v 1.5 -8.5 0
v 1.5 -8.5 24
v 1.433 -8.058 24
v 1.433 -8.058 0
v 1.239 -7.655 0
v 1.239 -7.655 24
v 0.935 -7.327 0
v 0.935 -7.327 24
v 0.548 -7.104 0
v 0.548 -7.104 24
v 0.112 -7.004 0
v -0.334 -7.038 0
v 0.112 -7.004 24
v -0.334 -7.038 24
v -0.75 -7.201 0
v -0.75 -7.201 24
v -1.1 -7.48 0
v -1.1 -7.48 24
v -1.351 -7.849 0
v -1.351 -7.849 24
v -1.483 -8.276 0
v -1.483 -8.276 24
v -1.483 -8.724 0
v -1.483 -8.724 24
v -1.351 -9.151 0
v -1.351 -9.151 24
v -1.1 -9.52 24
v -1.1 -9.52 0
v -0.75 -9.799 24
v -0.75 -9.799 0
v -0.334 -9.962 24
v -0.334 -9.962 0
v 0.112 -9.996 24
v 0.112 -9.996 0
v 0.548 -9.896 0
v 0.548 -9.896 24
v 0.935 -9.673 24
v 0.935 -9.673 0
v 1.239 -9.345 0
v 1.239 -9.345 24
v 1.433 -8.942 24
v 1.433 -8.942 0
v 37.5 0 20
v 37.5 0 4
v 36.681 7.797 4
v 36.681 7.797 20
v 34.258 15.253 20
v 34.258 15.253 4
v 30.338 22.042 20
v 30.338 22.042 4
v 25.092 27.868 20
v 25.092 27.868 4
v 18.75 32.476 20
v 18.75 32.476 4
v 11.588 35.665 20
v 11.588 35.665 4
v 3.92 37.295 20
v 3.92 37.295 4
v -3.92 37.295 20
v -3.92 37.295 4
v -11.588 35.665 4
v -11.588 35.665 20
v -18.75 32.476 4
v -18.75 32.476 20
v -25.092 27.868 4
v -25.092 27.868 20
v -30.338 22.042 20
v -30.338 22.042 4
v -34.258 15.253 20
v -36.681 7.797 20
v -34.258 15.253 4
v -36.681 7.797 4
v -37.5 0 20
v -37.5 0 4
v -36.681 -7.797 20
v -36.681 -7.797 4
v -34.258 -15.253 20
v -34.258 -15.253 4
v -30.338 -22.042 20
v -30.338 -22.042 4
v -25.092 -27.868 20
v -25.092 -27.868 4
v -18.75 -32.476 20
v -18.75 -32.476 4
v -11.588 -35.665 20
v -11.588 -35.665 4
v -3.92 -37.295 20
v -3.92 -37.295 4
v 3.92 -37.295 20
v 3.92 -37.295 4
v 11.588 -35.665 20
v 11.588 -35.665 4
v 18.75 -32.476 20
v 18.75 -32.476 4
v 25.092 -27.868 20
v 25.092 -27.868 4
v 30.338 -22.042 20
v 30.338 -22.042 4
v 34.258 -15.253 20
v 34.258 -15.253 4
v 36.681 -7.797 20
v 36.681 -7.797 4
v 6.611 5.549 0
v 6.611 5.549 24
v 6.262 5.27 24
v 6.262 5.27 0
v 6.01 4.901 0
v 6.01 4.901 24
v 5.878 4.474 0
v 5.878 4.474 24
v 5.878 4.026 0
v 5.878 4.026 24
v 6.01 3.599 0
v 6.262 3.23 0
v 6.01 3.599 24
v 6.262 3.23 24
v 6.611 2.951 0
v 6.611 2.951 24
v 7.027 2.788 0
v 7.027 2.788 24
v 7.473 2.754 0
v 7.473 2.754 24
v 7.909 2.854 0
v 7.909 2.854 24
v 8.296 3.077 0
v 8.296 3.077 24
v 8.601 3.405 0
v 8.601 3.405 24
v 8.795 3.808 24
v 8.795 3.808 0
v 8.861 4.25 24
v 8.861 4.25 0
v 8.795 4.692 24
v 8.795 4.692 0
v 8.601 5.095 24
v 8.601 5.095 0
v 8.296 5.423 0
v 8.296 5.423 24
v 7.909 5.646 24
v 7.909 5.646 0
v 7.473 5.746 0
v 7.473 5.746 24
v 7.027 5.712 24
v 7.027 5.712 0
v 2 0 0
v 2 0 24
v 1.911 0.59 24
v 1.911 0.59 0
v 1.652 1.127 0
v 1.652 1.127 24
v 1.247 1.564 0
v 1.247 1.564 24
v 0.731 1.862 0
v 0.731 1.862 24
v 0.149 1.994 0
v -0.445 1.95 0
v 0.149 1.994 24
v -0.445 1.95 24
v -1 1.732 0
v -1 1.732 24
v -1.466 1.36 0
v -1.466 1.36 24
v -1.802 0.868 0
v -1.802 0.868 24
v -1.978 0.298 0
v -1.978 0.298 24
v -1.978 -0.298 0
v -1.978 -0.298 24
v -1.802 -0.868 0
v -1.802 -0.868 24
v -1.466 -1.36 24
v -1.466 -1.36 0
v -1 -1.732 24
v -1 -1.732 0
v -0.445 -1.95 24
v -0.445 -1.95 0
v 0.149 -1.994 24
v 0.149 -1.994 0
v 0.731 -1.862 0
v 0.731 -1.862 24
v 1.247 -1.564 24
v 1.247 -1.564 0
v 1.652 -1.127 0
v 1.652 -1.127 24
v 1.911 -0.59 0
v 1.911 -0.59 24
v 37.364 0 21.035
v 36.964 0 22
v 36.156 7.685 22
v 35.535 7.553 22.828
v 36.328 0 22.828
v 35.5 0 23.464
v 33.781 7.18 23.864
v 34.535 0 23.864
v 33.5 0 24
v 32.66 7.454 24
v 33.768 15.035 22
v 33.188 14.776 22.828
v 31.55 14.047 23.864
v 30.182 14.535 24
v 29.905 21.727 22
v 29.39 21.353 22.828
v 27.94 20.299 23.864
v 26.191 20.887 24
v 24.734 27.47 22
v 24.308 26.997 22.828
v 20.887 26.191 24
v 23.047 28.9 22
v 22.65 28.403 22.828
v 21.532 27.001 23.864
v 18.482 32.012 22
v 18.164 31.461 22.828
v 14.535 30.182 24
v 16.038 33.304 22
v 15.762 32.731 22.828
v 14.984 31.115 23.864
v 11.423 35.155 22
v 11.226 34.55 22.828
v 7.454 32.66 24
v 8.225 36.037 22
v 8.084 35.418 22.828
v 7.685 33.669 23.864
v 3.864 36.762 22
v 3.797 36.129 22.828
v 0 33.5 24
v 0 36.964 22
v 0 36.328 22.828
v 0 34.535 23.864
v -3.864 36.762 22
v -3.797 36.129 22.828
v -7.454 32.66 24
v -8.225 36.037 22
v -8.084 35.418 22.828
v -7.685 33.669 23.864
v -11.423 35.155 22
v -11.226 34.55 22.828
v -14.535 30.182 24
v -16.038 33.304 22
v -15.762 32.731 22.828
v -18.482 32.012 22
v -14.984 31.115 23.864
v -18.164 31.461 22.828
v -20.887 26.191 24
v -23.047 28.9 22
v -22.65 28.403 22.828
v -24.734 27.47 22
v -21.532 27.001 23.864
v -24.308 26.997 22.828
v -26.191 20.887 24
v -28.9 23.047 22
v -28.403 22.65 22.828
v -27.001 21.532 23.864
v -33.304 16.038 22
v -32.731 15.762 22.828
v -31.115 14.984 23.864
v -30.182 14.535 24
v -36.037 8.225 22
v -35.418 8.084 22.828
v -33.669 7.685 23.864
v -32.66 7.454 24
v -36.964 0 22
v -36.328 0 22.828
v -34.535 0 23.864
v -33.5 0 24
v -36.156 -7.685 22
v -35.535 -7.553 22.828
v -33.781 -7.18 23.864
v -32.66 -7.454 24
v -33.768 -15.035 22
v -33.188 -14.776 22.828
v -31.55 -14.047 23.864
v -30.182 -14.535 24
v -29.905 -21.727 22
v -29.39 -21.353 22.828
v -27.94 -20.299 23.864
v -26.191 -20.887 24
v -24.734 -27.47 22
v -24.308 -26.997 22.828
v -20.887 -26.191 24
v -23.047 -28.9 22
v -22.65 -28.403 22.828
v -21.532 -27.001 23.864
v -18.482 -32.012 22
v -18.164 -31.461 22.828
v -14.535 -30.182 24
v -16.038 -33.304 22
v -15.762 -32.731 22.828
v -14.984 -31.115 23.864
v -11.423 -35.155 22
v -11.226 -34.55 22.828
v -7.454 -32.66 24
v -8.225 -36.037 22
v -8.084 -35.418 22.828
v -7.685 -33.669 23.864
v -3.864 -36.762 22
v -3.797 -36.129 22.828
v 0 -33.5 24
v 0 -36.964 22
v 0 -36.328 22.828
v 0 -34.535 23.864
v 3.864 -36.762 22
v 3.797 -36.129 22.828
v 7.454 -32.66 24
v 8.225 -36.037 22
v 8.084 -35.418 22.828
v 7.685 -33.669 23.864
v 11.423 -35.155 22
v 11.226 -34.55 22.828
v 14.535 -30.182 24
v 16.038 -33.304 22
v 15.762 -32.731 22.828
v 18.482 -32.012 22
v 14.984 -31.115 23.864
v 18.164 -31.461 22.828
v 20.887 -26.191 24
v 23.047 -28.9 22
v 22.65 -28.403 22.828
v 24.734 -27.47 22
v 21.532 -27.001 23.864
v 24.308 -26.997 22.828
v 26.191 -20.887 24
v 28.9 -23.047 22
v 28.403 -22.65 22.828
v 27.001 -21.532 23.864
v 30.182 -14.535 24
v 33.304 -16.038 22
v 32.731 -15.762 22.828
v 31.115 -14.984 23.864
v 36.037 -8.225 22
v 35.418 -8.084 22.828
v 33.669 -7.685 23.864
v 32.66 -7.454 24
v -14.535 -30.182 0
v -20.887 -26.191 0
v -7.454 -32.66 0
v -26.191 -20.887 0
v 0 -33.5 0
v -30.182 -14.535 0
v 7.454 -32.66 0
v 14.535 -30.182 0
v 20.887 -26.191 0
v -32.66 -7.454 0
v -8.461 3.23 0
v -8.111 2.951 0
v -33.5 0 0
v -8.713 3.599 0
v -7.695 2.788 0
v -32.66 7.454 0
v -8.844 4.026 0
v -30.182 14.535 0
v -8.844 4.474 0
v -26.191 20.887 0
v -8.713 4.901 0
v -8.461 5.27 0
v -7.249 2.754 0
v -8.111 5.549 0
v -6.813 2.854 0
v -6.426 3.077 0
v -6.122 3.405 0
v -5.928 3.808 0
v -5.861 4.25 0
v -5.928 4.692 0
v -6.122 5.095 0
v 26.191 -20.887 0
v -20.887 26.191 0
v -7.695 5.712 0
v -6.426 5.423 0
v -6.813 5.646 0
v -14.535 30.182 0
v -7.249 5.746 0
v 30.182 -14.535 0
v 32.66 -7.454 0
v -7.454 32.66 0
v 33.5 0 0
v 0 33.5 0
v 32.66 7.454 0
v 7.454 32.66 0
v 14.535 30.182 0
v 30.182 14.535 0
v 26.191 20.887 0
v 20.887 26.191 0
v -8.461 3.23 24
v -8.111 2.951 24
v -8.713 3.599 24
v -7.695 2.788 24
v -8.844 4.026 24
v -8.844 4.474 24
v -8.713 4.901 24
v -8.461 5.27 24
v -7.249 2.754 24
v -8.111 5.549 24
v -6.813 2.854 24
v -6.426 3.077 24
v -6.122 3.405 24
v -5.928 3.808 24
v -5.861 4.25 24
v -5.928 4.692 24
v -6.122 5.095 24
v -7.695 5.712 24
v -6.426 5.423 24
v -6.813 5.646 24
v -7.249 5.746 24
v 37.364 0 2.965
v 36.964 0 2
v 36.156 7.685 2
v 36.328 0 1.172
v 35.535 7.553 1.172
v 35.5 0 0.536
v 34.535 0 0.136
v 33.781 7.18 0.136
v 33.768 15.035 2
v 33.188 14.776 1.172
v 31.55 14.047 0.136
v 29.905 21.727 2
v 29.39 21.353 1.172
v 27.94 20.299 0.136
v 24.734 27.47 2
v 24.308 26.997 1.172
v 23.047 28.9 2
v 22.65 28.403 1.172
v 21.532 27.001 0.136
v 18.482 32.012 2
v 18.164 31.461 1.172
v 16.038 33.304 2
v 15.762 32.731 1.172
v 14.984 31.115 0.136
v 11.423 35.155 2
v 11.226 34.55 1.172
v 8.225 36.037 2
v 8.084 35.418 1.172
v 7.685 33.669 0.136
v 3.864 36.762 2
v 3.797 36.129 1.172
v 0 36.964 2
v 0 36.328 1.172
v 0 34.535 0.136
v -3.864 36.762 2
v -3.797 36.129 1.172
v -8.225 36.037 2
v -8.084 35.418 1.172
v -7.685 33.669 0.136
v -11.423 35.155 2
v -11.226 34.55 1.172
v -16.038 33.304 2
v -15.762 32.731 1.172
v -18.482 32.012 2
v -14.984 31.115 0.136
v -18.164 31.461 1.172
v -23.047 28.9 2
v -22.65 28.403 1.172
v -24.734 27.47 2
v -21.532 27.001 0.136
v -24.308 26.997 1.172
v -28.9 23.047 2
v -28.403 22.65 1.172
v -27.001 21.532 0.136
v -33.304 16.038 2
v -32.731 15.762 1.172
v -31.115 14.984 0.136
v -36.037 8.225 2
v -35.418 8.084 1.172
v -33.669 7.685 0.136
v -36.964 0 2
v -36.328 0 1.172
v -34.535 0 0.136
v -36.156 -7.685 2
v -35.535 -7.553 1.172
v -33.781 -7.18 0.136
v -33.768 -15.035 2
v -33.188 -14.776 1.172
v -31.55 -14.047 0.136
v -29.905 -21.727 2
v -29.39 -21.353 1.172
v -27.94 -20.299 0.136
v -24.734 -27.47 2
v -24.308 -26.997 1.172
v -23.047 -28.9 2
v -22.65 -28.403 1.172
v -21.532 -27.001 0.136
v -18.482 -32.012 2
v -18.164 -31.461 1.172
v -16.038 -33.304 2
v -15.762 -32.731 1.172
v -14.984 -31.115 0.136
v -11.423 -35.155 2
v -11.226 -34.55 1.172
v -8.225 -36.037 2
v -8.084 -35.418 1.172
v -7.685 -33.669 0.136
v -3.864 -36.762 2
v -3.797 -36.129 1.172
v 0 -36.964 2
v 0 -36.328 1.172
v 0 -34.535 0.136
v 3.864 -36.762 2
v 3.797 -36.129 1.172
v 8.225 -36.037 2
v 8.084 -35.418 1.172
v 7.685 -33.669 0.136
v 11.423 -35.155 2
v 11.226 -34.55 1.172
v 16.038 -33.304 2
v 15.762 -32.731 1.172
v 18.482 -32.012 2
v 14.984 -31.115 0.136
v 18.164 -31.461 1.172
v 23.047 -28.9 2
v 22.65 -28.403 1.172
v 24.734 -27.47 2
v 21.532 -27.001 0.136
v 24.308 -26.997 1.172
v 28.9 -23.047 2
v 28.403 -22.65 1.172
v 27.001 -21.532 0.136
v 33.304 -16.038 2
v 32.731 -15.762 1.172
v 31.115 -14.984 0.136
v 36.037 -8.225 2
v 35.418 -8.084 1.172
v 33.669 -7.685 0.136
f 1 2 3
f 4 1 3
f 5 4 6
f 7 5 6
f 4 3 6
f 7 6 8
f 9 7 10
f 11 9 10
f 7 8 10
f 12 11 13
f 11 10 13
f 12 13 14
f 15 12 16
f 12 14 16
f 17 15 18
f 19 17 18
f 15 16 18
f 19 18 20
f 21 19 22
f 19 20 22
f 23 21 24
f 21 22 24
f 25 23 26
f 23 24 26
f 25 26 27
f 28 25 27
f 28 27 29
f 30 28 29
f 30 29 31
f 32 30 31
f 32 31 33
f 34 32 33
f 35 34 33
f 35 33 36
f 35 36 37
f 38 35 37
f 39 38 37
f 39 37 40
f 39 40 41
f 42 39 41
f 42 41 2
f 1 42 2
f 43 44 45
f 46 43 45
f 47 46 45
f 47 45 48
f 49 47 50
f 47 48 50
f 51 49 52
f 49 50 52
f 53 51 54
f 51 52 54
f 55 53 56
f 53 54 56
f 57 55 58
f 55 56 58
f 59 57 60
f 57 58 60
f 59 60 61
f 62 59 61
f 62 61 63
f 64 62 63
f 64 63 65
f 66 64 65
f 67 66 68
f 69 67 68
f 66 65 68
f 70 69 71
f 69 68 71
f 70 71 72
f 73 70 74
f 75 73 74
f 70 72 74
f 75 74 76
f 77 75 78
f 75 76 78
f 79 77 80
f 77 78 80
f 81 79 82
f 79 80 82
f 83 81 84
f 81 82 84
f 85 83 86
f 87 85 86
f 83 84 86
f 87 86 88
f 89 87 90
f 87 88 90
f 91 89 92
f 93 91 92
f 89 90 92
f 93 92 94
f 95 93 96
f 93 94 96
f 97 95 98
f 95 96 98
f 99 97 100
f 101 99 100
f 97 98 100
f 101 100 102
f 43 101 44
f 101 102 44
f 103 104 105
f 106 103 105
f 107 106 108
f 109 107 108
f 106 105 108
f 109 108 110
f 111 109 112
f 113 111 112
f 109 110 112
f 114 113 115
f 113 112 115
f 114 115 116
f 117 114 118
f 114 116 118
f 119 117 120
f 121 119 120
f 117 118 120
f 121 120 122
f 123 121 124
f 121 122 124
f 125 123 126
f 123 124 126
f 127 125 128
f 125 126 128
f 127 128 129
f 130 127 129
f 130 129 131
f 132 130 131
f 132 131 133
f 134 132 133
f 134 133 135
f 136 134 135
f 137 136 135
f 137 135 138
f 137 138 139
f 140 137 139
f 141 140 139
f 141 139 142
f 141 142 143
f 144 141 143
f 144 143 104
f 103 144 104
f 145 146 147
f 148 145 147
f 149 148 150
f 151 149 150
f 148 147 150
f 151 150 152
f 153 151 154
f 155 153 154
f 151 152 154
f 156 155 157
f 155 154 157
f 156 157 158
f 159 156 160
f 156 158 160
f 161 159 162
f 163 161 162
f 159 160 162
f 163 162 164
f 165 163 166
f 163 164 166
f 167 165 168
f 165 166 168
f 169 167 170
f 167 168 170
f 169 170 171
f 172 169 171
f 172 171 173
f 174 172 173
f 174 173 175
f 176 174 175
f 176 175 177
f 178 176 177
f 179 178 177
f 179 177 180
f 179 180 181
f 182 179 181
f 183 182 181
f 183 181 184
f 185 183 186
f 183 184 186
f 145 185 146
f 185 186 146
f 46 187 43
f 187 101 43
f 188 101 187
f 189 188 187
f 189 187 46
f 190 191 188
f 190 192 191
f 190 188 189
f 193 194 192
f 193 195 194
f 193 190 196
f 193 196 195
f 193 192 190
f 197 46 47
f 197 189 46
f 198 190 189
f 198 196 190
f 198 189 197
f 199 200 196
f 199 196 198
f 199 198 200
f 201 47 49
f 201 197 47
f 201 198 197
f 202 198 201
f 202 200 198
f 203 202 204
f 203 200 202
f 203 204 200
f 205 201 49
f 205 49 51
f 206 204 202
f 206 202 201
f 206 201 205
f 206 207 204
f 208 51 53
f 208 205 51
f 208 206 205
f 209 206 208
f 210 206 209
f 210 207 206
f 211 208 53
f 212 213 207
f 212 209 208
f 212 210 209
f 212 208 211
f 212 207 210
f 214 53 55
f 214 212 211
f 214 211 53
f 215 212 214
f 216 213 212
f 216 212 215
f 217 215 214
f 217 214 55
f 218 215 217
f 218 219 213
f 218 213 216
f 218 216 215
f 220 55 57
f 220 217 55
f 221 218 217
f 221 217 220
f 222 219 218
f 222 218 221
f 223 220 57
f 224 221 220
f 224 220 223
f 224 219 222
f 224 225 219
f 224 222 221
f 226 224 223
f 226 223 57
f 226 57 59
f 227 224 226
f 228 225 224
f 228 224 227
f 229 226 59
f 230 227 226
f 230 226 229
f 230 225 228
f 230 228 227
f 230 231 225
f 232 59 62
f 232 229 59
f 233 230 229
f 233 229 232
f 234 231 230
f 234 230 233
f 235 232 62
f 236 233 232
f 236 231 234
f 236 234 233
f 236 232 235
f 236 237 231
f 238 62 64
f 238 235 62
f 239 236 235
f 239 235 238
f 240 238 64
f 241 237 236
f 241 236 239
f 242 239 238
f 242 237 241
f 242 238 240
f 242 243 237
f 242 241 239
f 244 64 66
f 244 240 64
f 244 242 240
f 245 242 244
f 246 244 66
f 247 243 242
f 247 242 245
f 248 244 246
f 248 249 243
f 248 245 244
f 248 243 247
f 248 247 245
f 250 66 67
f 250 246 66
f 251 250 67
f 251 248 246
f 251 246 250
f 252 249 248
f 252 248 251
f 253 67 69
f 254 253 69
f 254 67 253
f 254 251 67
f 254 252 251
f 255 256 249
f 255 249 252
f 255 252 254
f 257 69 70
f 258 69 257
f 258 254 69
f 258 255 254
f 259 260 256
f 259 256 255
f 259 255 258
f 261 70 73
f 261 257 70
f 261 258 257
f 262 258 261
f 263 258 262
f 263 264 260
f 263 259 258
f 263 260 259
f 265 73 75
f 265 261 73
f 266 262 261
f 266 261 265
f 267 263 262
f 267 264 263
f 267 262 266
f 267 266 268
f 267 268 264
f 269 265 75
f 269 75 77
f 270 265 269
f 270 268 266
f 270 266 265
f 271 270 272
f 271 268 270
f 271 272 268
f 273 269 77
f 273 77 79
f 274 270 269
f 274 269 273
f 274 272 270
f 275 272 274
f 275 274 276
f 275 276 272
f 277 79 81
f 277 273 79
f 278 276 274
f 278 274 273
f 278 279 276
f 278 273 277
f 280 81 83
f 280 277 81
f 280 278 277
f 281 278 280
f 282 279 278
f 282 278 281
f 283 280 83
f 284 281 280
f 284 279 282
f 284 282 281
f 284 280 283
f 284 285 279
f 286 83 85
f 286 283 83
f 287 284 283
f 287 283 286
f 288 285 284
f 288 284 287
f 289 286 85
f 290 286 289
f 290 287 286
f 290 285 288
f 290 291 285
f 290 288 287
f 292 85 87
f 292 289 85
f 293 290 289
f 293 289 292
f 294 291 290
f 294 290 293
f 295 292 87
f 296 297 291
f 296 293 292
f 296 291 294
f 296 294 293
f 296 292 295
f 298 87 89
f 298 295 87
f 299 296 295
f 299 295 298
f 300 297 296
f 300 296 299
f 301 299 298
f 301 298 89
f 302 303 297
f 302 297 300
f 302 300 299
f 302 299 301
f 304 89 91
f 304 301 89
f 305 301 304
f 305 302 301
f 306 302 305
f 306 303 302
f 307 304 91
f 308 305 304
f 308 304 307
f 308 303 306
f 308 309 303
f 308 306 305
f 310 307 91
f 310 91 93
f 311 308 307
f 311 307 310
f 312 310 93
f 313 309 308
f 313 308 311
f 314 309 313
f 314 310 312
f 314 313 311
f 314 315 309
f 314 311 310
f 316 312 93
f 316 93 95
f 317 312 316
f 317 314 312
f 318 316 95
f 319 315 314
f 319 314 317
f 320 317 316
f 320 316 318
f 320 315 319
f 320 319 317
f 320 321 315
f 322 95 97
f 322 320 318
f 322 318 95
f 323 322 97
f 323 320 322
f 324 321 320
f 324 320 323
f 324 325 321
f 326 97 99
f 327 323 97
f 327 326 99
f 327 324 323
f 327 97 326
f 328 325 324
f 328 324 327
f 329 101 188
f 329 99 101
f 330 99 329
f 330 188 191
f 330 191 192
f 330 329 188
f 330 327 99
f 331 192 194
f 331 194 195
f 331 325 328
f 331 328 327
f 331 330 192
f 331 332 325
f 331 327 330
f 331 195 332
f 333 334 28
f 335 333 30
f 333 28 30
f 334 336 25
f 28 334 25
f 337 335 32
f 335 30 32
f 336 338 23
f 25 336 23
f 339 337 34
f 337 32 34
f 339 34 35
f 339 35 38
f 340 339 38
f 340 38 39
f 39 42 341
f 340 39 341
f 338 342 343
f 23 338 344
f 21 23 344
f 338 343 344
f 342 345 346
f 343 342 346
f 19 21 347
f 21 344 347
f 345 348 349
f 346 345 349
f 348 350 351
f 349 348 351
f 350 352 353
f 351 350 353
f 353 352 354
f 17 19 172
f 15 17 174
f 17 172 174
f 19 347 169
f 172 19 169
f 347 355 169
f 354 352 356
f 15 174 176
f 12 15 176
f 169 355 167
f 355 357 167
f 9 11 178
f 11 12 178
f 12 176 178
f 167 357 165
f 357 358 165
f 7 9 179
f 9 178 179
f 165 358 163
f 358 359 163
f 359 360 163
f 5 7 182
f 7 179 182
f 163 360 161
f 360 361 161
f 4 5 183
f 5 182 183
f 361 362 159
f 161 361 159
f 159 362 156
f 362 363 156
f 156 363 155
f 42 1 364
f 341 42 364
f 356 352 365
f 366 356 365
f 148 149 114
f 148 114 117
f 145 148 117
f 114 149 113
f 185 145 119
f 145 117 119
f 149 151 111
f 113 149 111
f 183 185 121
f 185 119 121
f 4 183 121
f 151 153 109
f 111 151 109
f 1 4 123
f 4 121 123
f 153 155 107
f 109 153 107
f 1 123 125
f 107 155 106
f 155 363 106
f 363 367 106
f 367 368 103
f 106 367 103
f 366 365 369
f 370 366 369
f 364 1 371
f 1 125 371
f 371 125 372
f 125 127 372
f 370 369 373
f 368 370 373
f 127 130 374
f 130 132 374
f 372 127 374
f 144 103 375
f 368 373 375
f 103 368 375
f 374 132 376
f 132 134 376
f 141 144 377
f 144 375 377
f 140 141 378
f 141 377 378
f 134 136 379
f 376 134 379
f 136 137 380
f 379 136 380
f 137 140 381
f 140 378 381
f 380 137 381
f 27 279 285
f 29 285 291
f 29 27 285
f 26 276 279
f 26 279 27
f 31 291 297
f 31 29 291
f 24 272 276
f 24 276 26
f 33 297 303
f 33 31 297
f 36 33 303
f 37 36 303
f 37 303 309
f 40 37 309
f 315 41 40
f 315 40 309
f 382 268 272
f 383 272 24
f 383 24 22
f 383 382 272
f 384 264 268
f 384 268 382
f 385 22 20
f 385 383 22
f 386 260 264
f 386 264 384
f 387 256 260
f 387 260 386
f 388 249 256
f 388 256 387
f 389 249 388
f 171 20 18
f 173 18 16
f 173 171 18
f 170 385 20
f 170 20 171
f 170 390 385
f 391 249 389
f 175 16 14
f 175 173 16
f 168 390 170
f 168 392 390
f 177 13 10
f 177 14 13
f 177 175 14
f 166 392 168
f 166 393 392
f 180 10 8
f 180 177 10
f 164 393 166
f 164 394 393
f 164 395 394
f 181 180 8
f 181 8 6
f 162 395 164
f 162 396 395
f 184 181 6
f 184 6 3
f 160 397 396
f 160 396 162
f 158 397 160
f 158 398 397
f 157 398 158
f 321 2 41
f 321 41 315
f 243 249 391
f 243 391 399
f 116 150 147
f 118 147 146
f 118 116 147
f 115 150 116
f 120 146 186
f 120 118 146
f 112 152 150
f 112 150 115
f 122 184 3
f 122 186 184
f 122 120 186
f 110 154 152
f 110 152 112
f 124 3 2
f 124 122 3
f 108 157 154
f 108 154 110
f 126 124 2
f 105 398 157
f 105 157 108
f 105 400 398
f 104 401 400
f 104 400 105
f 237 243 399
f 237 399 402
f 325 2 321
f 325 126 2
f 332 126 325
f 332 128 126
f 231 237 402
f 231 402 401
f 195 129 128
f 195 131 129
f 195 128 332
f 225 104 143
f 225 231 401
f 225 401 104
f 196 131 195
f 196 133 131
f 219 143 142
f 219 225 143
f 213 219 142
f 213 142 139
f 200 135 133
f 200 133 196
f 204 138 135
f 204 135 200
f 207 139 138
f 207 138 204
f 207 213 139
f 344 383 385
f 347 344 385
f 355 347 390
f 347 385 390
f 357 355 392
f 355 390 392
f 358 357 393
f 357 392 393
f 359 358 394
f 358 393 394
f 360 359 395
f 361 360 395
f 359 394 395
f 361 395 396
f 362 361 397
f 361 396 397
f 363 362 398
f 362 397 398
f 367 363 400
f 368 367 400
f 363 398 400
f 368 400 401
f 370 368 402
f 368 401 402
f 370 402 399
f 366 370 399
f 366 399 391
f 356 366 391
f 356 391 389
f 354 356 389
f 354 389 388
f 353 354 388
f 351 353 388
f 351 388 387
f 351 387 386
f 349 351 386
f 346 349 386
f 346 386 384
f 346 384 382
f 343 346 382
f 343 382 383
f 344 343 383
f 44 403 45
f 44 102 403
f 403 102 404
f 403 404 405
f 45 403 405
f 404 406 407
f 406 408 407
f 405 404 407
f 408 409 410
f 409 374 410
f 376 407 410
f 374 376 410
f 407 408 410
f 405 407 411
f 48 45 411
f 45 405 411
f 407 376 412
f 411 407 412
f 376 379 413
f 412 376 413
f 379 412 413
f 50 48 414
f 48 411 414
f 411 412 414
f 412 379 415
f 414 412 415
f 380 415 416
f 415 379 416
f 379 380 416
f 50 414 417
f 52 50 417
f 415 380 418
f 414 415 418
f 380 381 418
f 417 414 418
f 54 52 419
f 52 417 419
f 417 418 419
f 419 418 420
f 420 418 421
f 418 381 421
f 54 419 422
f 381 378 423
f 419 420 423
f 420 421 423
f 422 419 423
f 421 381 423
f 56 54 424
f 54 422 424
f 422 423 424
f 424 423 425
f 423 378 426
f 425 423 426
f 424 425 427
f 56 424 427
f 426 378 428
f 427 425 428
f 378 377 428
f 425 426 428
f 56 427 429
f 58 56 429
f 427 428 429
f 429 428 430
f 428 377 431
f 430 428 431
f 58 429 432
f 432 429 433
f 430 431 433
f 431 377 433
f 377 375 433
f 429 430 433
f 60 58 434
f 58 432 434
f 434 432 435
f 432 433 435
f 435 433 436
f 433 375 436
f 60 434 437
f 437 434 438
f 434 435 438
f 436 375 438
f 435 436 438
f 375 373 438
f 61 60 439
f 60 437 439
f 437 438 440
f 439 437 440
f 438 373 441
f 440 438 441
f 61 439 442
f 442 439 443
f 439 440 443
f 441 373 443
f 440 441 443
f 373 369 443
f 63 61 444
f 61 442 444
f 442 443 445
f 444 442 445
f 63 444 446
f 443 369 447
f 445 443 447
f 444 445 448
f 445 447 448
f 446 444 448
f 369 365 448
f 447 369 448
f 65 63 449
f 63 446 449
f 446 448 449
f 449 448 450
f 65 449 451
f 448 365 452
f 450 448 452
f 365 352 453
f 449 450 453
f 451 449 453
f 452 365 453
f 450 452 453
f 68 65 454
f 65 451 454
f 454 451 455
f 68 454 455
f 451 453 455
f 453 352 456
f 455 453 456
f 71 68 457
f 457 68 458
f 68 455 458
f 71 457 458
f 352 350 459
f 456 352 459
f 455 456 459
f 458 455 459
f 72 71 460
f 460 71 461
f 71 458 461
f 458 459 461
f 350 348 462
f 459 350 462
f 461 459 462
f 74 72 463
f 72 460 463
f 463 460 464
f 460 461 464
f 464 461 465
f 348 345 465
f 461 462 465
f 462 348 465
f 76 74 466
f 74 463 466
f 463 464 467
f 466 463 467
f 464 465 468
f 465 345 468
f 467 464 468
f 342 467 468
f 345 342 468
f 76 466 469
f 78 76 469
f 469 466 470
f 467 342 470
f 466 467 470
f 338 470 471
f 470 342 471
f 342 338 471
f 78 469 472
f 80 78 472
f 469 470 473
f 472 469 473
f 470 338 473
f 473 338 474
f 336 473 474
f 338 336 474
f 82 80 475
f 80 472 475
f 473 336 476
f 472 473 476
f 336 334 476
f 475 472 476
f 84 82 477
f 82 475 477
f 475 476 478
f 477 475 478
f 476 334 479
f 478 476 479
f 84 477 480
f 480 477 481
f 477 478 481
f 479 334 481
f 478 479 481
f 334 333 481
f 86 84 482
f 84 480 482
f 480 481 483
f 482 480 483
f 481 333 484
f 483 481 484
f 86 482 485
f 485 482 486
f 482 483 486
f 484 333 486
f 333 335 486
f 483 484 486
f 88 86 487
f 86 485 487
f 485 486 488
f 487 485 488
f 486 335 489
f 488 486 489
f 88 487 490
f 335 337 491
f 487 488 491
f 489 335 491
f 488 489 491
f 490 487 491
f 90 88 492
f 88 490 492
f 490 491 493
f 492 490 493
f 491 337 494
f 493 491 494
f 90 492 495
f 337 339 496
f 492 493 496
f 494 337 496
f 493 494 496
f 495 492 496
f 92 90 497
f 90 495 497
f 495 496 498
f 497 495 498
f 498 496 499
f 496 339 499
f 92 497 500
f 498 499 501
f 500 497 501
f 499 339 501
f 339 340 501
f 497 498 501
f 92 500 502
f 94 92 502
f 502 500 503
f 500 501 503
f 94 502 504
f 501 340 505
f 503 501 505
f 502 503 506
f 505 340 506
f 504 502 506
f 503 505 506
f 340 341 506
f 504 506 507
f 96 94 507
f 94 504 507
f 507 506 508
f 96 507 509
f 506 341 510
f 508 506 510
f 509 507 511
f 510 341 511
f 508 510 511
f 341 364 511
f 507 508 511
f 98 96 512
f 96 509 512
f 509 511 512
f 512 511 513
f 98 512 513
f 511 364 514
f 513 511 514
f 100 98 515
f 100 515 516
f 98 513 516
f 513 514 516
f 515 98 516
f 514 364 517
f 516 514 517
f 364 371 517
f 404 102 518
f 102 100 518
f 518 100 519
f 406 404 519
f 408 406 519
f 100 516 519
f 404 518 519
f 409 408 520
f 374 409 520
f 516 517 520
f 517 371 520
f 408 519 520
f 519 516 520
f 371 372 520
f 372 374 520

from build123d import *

# Parameters (mm, degrees)
SKETCH1_R           = 37.5
BOSS_EXTRUDE2_DEPTH = 24
FILLET1_R           = 4
SKETCH2_R           = 2
CUT_EXTRUDE1_DEPTH  = 24
SKETCH3_R           = 1.5
CUT_EXTRUDE3_DEPTH  = 25
CIRPATTERN1_COUNT   = 3


with BuildPart() as part:
    # Sketch1 → Boss-Extrude2 (new body)
    with BuildSketch(Plane.XY):
        Circle(SKETCH1_R)
    extrude(amount=BOSS_EXTRUDE2_DEPTH)

    # Fillet1
    fillet1_edges = [part.edges().sort_by_distance(p)[0] for p in [
        (-37.5, 0, 0),
        (-37.5, 0, 24),
    ]]
    fillet(fillet1_edges, radius=FILLET1_R)

    # Sketch2 → Cut-Extrude1 (cut)
    with BuildSketch(Plane.XY.offset(24)):
        Circle(SKETCH2_R)
    extrude(amount=-CUT_EXTRUDE1_DEPTH, mode=Mode.SUBTRACT)

    # Sketch3 → Cut-Extrude3 (cut, through all)
    with BuildSketch(Plane.XY.offset(24)):
        with Locations((0, -8.5)):
            Circle(SKETCH3_R)
    cut_extrude3 = extrude(amount=-CUT_EXTRUDE3_DEPTH, mode=Mode.SUBTRACT)

    # CirPattern1: Cut-Extrude3 ×3 about axis
    cirpattern1_axis = Axis((0, 0, 0), (0, 0, 1))
    for i in range(1, CIRPATTERN1_COUNT):
        add(cut_extrude3.rotate(cirpattern1_axis, i * 360 / CIRPATTERN1_COUNT), mode=Mode.SUBTRACT)


solid = part.part
